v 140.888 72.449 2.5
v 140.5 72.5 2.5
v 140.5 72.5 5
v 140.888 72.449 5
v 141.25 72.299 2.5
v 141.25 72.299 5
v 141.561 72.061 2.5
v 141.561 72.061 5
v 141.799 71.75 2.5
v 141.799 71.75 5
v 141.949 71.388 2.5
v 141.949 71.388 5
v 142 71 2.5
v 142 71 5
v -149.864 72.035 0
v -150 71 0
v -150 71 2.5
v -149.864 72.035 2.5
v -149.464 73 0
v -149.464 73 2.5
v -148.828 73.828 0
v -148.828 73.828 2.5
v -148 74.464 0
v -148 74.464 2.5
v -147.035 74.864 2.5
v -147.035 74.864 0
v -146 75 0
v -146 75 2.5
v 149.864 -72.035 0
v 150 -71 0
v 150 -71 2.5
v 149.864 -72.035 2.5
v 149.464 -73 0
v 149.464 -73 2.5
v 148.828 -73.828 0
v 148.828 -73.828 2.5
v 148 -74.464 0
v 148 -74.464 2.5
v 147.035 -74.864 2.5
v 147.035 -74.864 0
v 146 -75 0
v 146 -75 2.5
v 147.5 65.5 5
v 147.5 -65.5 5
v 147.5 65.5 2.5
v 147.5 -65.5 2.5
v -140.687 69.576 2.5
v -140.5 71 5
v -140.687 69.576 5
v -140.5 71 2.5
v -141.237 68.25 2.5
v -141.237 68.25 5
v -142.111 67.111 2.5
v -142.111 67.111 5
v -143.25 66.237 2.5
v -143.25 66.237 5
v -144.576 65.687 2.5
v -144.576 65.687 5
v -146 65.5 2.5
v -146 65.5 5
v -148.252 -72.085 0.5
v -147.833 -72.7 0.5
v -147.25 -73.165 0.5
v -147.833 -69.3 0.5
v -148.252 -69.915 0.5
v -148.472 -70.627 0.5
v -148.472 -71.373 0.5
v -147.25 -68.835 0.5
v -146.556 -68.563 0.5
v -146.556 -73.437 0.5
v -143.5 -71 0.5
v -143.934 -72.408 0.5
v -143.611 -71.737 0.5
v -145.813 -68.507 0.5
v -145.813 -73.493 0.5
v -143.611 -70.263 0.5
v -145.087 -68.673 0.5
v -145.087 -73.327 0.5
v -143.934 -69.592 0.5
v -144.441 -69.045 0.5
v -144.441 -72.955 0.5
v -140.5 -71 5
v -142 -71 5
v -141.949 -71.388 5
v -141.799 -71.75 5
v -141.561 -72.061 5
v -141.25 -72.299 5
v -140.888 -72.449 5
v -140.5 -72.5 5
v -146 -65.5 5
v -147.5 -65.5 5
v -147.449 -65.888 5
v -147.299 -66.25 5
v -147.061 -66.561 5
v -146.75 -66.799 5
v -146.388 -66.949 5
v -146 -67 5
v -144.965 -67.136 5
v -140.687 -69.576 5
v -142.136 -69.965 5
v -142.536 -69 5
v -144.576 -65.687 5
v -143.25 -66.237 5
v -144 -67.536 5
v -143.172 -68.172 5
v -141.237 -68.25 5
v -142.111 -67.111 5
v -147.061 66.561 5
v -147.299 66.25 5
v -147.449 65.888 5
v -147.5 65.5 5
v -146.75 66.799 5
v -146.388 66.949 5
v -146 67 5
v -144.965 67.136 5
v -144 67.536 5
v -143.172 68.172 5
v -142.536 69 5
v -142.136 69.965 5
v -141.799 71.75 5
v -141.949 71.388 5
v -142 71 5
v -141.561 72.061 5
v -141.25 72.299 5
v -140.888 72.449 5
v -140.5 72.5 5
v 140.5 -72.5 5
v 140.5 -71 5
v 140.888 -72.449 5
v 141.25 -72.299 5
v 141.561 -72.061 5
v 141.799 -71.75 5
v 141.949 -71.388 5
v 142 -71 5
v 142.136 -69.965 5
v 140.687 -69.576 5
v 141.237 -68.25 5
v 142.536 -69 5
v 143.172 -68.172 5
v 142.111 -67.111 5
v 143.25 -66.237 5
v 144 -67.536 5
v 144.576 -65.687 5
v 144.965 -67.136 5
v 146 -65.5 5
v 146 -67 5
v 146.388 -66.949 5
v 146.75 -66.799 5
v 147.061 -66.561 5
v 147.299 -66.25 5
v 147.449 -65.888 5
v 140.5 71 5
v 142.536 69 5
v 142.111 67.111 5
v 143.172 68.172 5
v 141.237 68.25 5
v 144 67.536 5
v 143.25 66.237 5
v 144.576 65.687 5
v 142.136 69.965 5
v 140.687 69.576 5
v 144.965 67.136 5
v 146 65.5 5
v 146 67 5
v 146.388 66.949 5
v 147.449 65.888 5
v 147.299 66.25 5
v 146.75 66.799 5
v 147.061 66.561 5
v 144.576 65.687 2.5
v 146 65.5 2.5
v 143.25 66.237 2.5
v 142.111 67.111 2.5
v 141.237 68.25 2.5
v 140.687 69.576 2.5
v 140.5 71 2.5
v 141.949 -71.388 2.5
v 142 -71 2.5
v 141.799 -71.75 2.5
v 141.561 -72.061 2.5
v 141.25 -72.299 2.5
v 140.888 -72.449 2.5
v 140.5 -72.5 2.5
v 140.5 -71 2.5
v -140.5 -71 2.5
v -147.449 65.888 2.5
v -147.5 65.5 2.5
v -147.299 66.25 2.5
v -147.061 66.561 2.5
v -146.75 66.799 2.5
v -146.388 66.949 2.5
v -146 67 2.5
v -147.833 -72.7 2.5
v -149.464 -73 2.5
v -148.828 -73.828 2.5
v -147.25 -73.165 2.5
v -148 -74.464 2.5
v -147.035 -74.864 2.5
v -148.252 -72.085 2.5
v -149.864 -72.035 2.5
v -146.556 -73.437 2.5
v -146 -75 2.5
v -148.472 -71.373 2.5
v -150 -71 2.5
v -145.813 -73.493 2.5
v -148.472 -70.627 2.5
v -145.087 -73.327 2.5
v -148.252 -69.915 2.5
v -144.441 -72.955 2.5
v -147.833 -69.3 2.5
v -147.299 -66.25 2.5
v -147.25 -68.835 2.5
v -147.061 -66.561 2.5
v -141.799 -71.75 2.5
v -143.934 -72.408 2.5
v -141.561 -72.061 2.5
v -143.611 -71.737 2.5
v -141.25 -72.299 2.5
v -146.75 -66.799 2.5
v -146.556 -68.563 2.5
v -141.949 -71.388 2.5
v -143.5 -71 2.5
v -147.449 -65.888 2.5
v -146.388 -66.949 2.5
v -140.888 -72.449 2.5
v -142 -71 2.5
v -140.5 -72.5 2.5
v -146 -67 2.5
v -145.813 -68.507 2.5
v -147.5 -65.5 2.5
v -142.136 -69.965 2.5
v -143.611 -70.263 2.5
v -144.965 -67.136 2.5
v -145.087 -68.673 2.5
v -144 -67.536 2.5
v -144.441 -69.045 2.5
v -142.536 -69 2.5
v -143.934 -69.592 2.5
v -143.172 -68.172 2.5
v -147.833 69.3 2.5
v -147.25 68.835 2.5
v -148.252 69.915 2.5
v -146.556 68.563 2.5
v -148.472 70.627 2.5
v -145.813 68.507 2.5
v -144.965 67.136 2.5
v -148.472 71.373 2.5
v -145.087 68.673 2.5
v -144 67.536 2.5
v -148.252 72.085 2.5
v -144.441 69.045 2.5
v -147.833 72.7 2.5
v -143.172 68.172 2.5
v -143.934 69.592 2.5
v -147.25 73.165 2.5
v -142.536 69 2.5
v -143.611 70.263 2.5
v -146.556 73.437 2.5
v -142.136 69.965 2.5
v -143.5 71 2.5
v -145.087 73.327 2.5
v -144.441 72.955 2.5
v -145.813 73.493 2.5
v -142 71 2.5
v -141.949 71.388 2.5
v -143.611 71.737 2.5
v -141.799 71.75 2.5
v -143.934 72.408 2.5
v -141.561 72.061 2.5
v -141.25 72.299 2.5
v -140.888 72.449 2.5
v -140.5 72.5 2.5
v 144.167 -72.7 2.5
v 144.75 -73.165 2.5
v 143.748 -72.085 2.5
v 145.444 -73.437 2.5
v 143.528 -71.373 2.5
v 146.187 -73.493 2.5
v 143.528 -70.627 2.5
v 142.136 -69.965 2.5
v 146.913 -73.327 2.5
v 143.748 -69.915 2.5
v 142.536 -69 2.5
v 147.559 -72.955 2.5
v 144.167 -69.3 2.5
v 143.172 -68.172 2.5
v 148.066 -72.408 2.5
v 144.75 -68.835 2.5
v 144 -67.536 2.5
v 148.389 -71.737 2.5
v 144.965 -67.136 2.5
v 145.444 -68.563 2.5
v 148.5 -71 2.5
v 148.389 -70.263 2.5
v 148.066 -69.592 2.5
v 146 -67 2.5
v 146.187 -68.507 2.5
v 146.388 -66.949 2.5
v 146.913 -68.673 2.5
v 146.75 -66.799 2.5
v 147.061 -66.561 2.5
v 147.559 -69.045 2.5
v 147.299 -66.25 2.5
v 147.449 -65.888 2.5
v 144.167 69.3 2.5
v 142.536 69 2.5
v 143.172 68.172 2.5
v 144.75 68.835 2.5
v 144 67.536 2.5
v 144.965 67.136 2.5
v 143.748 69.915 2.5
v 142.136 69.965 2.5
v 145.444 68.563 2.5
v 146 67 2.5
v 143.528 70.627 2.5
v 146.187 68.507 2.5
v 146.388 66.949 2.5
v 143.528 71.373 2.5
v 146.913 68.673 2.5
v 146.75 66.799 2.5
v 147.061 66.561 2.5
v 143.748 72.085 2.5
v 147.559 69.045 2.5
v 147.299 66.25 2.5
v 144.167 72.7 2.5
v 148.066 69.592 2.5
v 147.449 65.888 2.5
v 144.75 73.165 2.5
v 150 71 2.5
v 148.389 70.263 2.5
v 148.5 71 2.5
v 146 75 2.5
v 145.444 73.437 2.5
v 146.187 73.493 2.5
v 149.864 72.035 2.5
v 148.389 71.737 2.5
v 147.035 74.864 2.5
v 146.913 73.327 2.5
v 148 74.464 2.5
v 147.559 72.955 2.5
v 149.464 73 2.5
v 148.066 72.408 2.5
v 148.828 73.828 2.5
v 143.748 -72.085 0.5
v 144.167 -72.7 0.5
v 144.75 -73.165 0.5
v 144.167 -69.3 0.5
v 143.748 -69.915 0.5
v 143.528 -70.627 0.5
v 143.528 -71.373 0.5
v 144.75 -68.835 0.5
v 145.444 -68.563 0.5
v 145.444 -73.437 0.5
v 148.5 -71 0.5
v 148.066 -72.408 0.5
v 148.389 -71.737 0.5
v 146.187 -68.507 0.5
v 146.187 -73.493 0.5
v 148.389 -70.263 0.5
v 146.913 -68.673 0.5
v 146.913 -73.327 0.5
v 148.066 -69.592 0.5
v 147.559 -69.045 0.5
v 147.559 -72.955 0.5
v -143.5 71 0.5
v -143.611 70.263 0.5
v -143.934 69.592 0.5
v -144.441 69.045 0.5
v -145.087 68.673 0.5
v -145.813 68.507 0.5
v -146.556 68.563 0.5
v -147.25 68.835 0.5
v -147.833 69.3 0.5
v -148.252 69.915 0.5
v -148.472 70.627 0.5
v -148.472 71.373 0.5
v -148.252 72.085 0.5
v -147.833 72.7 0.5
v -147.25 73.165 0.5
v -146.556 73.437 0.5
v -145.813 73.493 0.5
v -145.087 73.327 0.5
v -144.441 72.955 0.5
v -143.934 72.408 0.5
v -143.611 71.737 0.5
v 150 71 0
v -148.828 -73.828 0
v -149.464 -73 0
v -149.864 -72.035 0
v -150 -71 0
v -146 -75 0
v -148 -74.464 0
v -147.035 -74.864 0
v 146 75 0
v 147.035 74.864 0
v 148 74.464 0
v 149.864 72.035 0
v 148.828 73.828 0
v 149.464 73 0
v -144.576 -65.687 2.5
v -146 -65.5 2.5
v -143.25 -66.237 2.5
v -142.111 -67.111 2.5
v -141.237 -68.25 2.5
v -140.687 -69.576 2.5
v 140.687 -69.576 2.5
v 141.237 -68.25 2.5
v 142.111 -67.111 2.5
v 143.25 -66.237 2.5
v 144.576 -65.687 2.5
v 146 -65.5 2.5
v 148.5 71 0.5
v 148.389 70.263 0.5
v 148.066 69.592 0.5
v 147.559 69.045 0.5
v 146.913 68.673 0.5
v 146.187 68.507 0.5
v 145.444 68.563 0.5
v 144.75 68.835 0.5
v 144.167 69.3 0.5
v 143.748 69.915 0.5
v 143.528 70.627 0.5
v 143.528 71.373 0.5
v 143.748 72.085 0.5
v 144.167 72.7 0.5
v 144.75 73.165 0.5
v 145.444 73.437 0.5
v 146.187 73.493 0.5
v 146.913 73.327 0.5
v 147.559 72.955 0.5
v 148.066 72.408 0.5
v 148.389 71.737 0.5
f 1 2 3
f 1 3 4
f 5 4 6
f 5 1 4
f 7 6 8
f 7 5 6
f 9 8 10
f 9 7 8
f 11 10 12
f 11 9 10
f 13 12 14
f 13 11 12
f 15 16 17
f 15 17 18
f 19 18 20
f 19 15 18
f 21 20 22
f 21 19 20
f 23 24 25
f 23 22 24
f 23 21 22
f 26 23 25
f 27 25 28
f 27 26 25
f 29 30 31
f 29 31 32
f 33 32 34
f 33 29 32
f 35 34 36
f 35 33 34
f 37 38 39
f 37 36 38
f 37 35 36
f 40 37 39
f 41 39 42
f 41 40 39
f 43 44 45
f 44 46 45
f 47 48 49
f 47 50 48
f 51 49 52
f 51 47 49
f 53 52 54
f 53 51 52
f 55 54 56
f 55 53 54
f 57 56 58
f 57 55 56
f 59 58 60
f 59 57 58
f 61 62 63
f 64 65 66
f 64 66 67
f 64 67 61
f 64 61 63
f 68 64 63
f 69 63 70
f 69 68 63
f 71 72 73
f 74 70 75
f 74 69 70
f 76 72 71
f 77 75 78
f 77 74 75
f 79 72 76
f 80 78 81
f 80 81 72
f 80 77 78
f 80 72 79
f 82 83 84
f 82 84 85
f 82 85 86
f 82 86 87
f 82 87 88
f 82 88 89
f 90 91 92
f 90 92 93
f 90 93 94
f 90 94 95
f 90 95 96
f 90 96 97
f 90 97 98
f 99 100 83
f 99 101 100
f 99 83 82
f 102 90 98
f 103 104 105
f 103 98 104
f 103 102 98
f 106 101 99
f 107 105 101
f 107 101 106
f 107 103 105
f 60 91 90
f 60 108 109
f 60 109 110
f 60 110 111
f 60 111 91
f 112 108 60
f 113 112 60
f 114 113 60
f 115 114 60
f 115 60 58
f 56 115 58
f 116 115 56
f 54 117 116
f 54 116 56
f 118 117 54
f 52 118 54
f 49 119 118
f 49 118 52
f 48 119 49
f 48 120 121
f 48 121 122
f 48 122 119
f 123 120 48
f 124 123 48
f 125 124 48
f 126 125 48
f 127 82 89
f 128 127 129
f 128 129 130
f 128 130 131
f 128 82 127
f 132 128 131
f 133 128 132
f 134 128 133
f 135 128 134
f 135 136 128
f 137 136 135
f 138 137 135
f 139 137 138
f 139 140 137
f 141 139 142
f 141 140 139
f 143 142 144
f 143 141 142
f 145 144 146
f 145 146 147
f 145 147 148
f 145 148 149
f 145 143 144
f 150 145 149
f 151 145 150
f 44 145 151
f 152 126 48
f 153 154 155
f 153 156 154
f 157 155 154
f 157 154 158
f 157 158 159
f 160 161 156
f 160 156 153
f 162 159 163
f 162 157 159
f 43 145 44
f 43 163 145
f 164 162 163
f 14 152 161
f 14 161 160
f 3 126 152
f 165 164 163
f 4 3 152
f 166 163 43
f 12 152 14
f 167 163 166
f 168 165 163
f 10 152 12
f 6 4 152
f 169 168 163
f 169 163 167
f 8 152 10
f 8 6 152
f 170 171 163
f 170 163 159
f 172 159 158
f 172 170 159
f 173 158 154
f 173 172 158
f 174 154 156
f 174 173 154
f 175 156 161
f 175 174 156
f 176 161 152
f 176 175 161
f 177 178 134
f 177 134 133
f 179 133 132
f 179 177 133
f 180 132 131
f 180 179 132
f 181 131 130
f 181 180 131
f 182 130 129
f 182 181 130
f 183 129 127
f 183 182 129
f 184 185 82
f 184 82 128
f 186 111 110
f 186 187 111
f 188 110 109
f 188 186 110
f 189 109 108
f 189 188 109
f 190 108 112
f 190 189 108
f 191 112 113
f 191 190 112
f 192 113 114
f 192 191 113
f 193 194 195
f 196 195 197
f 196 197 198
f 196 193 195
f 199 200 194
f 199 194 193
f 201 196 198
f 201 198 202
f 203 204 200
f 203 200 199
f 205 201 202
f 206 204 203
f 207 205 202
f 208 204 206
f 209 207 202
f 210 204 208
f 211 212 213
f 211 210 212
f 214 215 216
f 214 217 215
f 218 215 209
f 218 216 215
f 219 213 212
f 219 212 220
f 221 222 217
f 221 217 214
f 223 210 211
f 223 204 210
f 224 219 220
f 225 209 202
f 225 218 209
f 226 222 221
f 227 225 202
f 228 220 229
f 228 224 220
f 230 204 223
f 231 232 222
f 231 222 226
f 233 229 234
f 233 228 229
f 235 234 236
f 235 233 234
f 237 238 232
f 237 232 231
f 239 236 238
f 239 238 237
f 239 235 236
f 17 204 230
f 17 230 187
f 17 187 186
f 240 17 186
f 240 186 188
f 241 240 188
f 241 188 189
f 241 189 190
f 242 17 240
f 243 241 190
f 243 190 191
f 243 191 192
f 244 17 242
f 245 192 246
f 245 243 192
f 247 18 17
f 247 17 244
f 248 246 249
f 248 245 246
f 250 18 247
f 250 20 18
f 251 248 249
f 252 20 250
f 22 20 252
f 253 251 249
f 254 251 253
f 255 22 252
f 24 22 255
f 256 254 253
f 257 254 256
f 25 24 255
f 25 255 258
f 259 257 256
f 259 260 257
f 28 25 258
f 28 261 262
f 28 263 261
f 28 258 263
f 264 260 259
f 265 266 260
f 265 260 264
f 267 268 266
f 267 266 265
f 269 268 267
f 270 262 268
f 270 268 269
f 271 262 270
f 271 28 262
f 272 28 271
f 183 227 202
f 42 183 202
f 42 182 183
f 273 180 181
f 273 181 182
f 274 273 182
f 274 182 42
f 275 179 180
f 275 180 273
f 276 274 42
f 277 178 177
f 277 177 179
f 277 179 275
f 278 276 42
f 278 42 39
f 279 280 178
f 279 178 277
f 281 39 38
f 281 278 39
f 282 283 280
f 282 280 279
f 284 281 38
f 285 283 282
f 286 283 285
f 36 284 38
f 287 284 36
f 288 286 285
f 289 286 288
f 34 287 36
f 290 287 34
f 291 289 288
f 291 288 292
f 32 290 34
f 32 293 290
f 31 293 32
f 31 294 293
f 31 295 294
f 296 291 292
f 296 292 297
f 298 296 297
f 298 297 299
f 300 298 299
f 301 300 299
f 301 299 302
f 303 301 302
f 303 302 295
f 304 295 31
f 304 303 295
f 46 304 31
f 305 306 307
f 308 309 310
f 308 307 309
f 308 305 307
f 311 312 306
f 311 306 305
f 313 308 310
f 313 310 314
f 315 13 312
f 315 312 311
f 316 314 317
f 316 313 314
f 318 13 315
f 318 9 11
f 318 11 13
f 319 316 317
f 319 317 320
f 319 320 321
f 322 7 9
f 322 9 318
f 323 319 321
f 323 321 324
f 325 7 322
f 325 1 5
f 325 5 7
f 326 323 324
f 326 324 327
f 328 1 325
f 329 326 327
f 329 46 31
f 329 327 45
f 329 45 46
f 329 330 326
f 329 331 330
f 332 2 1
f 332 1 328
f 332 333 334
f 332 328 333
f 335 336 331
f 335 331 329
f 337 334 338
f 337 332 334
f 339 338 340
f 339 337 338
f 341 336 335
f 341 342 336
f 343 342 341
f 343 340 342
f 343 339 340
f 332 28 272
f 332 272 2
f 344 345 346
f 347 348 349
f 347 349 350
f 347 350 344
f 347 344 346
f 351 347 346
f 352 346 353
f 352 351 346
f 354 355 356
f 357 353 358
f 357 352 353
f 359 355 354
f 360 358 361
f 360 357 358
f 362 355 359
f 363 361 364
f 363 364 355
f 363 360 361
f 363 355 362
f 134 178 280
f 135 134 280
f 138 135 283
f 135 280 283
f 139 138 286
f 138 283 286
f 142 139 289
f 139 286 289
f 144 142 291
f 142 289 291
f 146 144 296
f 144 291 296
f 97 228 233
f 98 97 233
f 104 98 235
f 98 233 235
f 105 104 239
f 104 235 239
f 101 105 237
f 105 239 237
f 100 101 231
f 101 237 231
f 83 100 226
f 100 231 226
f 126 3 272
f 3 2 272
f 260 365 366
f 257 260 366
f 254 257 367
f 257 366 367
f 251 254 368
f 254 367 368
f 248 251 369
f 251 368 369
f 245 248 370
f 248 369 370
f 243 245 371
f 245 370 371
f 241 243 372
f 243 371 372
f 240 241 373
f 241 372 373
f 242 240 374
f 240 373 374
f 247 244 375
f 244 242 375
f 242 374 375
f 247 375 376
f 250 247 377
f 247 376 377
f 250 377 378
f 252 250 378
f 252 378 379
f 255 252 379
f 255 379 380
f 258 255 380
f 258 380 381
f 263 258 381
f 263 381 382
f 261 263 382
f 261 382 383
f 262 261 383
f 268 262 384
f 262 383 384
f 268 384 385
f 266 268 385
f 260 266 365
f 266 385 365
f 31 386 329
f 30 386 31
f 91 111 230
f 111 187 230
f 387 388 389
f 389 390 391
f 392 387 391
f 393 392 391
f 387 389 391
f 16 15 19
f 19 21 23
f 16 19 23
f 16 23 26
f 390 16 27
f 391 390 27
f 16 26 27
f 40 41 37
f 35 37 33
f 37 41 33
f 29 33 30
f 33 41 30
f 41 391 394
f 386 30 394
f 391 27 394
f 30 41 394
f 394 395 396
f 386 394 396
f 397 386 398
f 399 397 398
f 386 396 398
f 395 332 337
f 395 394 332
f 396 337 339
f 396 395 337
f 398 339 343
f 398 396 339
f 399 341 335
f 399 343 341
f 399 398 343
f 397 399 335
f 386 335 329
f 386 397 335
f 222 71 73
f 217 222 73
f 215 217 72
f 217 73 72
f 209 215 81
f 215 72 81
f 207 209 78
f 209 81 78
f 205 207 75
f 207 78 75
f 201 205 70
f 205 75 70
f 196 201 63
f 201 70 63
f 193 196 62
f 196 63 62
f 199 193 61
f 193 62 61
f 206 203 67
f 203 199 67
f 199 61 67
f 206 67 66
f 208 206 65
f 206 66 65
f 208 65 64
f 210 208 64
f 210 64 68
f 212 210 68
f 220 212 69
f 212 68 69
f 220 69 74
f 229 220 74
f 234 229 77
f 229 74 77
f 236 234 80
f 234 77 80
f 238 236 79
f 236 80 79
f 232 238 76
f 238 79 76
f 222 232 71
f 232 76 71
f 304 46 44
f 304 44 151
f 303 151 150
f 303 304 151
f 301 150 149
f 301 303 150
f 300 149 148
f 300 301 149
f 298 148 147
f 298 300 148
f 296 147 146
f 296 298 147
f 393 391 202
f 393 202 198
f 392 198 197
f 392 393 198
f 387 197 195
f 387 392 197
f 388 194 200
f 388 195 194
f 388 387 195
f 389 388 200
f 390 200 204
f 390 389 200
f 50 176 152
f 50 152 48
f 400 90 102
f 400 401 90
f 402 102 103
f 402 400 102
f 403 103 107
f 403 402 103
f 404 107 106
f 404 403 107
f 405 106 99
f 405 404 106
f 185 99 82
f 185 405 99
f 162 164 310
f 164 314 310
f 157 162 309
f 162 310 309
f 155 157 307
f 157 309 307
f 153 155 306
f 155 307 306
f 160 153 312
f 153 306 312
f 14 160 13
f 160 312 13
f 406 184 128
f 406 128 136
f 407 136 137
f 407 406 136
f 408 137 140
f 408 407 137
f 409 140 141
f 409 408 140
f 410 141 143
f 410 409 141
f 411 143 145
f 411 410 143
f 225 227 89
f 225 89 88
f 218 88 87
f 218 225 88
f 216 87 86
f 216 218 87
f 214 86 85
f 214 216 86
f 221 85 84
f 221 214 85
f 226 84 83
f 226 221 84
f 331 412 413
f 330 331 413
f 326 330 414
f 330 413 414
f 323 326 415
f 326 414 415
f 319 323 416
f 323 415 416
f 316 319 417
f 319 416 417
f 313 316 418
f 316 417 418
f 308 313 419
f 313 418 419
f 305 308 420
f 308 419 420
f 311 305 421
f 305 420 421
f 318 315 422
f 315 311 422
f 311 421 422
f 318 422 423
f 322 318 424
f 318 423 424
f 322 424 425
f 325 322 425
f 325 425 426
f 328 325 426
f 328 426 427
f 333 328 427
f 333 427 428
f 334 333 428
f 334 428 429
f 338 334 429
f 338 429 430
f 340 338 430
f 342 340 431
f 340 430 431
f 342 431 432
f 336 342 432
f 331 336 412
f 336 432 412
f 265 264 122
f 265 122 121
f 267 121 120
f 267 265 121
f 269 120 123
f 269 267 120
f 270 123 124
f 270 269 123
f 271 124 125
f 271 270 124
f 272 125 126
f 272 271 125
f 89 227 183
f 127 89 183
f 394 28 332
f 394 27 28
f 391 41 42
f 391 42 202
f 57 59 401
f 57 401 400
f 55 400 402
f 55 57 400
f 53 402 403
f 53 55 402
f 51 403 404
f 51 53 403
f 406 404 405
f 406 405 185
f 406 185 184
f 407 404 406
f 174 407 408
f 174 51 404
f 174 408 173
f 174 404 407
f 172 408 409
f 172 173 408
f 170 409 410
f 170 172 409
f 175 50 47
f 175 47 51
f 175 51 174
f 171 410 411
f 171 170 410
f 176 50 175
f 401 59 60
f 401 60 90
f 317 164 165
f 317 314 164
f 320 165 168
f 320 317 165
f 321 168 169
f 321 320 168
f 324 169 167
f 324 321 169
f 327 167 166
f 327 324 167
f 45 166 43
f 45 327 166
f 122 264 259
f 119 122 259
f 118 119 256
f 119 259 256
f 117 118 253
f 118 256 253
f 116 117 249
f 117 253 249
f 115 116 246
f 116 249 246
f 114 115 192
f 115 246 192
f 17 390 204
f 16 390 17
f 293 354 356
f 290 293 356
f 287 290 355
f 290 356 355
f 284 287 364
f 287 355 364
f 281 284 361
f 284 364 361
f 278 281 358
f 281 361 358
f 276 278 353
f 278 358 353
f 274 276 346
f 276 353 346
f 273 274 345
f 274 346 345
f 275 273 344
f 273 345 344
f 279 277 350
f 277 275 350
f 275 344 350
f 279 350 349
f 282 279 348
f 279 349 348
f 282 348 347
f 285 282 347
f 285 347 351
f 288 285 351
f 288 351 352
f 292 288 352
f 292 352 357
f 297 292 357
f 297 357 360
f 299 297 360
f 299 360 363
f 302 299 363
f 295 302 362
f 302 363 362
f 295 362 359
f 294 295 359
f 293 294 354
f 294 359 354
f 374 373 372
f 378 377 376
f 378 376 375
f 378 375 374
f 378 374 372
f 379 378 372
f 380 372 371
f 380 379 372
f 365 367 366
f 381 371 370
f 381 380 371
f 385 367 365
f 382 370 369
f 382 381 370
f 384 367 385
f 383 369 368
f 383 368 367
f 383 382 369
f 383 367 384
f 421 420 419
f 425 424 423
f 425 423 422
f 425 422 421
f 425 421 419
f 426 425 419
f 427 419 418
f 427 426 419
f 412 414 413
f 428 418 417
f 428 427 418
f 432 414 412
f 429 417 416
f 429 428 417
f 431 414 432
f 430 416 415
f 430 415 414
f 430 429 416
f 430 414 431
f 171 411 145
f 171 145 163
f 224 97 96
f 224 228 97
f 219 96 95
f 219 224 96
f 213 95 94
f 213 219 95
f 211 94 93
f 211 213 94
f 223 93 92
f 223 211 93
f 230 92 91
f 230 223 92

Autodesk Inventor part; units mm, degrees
ref_plane "YZ Plane" through (0, 0, 0) normal (1, 0, 0) x (0, 1, 0)
ref_plane "XZ Plane" through (0, 0, 0) normal (0, 1, 0) x (-1, 0, 0)
ref_plane "XY Plane" through (0, 0, 0) normal (0, 0, 1) x (1, 0, 0)
sketch "Sketch1" plane through (0, 0, 0) normal (0, 0, 1) x (1, 0, 0)
  line L0 (-150, -75) -> (150, -75) construction
  line L1 (150, -75) -> (150, 75) construction
  line L2 (150, 75) -> (-150, 75) construction
  line L3 (-150, 75) -> (-150, -75) construction
  line L4 (-150, -75) -> (150, 75) construction
  line L5 (150, -75) -> (-150, 75) construction
  line L6 (147.5, -72.5) -> (-147.5, -72.5) construction
  line L7 (-147.5, -72.5) -> (-147.5, 72.5) construction
  line L8 (-147.5, 72.5) -> (147.5, 72.5) construction
  line L9 (147.5, 72.5) -> (147.5, -72.5) construction
  line L10 (147.5, -72.5) -> (-147.5, 72.5) construction
  line L11 (-147.5, -72.5) -> (147.5, 72.5) construction
  line L12 (-150, 75) -> (-146, 75) construction
  line L13 (-146, 75) -> (-146, 71) construction
  line L14 (-146, 71) -> (-150, 71) construction
  line L15 (-150, 71) -> (-150, 75) construction
  arc A0 (-146, 75) -> (-150, 71) centre (-146, 71) ccw
  line L16 (-150, -75) -> (-146, -75) construction
  line L17 (-146, -75) -> (-146, -71) construction
  line L18 (-146, -71) -> (-150, -71) construction
  line L19 (-150, -71) -> (-150, -75) construction
  line L20 (150, -75) -> (146, -75) construction
  line L21 (146, -75) -> (146, -71) construction
  line L22 (146, -71) -> (150, -71) construction
  line L23 (150, -71) -> (150, -75) construction
  line L24 (150, 75) -> (146, 75) construction
  line L25 (146, 75) -> (146, 71) construction
  line L26 (146, 71) -> (150, 71) construction
  line L27 (150, 71) -> (150, 75) construction
  line L28 (-146, 75) -> (146, 75)
  arc A1 (150, 71) -> (146, 75) centre (146, 71) ccw
  line L29 (150, 71) -> (150, -71)
  arc A2 (146, -75) -> (150, -71) centre (146, -71) ccw
  line L30 (146, -75) -> (-146, -75)
  arc A3 (-150, -71) -> (-146, -75) centre (-146, -71) ccw
  line L31 (-150, -71) -> (-150, 71)
  circle A4 centre (-146, 71) radius 2.5
  circle A5 centre (-146, -71) radius 2.5
  circle A6 centre (146, -71) radius 2.5
  circle A7 centre (146, 71) radius 2.5
  line L32 (-146, 71) -> (-142, 71) construction
  line L33 (-142, 71) -> (-142, 67) construction
  line L34 (-142, 67) -> (-146, 67) construction
  line L35 (-146, 67) -> (-146, 71) construction
  line L36 (-146, -71) -> (-142, -71) construction
  line L37 (-142, -71) -> (-142, -67) construction
  line L38 (-142, -67) -> (-146, -67) construction
  line L39 (-146, -67) -> (-146, -71) construction
  line L40 (146, -71) -> (142, -71) construction
  line L41 (142, -71) -> (142, -67) construction
  line L42 (142, -67) -> (146, -67) construction
  line L43 (146, -67) -> (146, -71) construction
  line L44 (146, 71) -> (142, 71) construction
  line L45 (142, 71) -> (142, 67) construction
  line L46 (142, 67) -> (146, 67) construction
  line L47 (146, 67) -> (146, 71) construction
  arc A8 (-146, 67) -> (-142, 71) centre (-146, 71) ccw
  arc A9 (-142, -71) -> (-146, -67) centre (-146, -71) ccw
  arc A10 (146, -67) -> (142, -71) centre (146, -71) ccw
  arc A11 (142, 71) -> (146, 67) centre (146, 71) ccw
  line L48 (-142, 71) -> (-140.5, 71) construction
  line L49 (-140.5, 71) -> (-140.5, 72.5) construction
  line L50 (-140.5, 72.5) -> (-142, 72.5) construction
  line L51 (-142, 72.5) -> (-142, 71) construction
  line L52 (-146, 67) -> (-147.5, 67) construction
  line L53 (-147.5, 67) -> (-147.5, 65.5) construction
  line L54 (-147.5, 65.5) -> (-146, 65.5) construction
  line L55 (-146, 65.5) -> (-146, 67) construction
  line L56 (142, 71) -> (140.5, 71) construction
  line L57 (140.5, 71) -> (140.5, 72.5) construction
  line L58 (140.5, 72.5) -> (142, 72.5) construction
  line L59 (142, 72.5) -> (142, 71) construction
  line L60 (146, 67) -> (147.5, 67) construction
  line L61 (147.5, 67) -> (147.5, 65.5) construction
  line L62 (147.5, 65.5) -> (146, 65.5) construction
  line L63 (146, 65.5) -> (146, 67) construction
  line L64 (146, -67) -> (147.5, -67) construction
  line L65 (147.5, -67) -> (147.5, -65.5) construction
  line L66 (147.5, -65.5) -> (146, -65.5) construction
  line L67 (146, -65.5) -> (146, -67) construction
  line L68 (142, -71) -> (140.5, -71) construction
  line L69 (140.5, -71) -> (140.5, -72.5) construction
  line L70 (140.5, -72.5) -> (142, -72.5) construction
  line L71 (142, -72.5) -> (142, -71) construction
  line L72 (-142, -71) -> (-140.5, -71) construction
  line L73 (-140.5, -71) -> (-140.5, -72.5) construction
  line L74 (-140.5, -72.5) -> (-142, -72.5) construction
  line L75 (-142, -72.5) -> (-142, -71) construction
  line L76 (-146, -67) -> (-147.5, -67) construction
  line L77 (-147.5, -67) -> (-147.5, -65.5) construction
  line L78 (-147.5, -65.5) -> (-146, -65.5) construction
  line L79 (-146, -65.5) -> (-146, -67) construction
  arc A12 (-147.5, -65.5) -> (-146, -67) centre (-146, -65.5) ccw
  arc A13 (-142, -71) -> (-140.5, -72.5) centre (-140.5, -71) ccw
  arc A14 (-140.5, 72.5) -> (-142, 71) centre (-140.5, 71) ccw
  arc A15 (-146, 67) -> (-147.5, 65.5) centre (-146, 65.5) ccw
  arc A16 (140.5, -72.5) -> (142, -71) centre (140.5, -71) ccw
  arc A17 (146, -67) -> (147.5, -65.5) centre (146, -65.5) ccw
  line L80 (147.5, -65.5) -> (147.5, 65.5)
  arc A18 (147.5, 65.5) -> (146, 67) centre (146, 65.5) ccw
  arc A19 (142, 71) -> (140.5, 72.5) centre (140.5, 71) ccw
  line L81 (140.5, 72.5) -> (-140.5, 72.5)
  line L82 (-147.5, 65.5) -> (-147.5, -65.5)
  line L83 (-140.5, -72.5) -> (140.5, -72.5)
  line L84 (146, 75) -> (-146, 75)
  arc A20 (-146, 75) -> (-150, 71) centre (-146, 71) ccw
  line L85 (-150, 71) -> (-150, -71)
  arc A21 (-150, -71) -> (-146, -75) centre (-146, -71) ccw
  line L86 (-146, -75) -> (146, -75)
  arc A22 (146, -75) -> (150, -71) centre (146, -71) ccw
  line L87 (150, -71) -> (150, 71)
  arc A23 (150, 71) -> (146, 75) centre (146, 71) ccw
  arc A24 (142, 71) -> (146, 67) centre (146, 71) ccw
  arc A25 (142, 71) -> (140.5, 72.5) centre (140.5, 71) ccw
  line L88 (140.5, 72.5) -> (-140.5, 72.5)
  arc A26 (-140.5, 72.5) -> (-142, 71) centre (-140.5, 71) ccw
  arc A27 (-146, 67) -> (-142, 71) centre (-146, 71) ccw
  arc A28 (-146, 67) -> (-147.5, 65.5) centre (-146, 65.5) ccw
  line L89 (-147.5, 65.5) -> (-147.5, -65.5)
  arc A29 (-147.5, -65.5) -> (-146, -67) centre (-146, -65.5) ccw
  arc A30 (-142, -71) -> (-146, -67) centre (-146, -71) ccw
  arc A31 (-142, -71) -> (-140.5, -72.5) centre (-140.5, -71) ccw
  line L90 (-140.5, -72.5) -> (140.5, -72.5)
  arc A32 (140.5, -72.5) -> (142, -71) centre (140.5, -71) ccw
  arc A33 (146, -67) -> (142, -71) centre (146, -71) ccw
  arc A34 (146, -67) -> (147.5, -65.5) centre (146, -65.5) ccw
  line L91 (147.5, -65.5) -> (147.5, 65.5)
  arc A35 (147.5, 65.5) -> (146, 67) centre (146, 65.5) ccw
  line L92 (-147.5, 72.5) -> (-140.5, 72.5) construction
  line L93 (-140.5, 72.5) -> (-140.5, 65.5) construction
  line L94 (-140.5, 65.5) -> (-147.5, 65.5) construction
  line L95 (-147.5, 65.5) -> (-147.5, 72.5) construction
  line L96 (-147.5, -72.5) -> (-140.5, -72.5) construction
  line L97 (-140.5, -72.5) -> (-140.5, -65.5) construction
  line L98 (-140.5, -65.5) -> (-147.5, -65.5) construction
  line L99 (-147.5, -65.5) -> (-147.5, -72.5) construction
  line L100 (147.5, -72.5) -> (140.5, -72.5) construction
  line L101 (140.5, -72.5) -> (140.5, -65.5) construction
  line L102 (140.5, -65.5) -> (147.5, -65.5) construction
  line L103 (147.5, -65.5) -> (147.5, -72.5) construction
  line L104 (140.5, 65.5) -> (147.5, 65.5) construction
  line L105 (147.5, 65.5) -> (147.5, 72.5) construction
  line L106 (147.5, 72.5) -> (140.5, 72.5) construction
  line L107 (140.5, 72.5) -> (140.5, 65.5) construction
  circle A36 centre (146, 71) radius 5.5 construction
  circle A37 centre (146, -71) radius 5.5 construction
  circle A38 centre (-146, -71) radius 5.5 construction
  circle A39 centre (-146, 71) radius 5.5 construction
  arc A40 (-146, 65.5) -> (-140.5, 71) centre (-146, 71) ccw
  arc A41 (140.5, 71) -> (146, 65.5) centre (146, 71) ccw
  line L108 (140.5, 71) -> (-140.5, 71)
  line L109 (-146, 65.5) -> (-146, -65.5)
  arc A42 (-140.5, -71) -> (-146, -65.5) centre (-146, -71) ccw
  line L110 (-140.5, -71) -> (140.5, -71)
  arc A43 (146, -65.5) -> (140.5, -71) centre (146, -71) ccw
  line L111 (146, -65.5) -> (146, 65.5)
  point P0 (0, 0)
  point P1 (0, 0)
  dimension "d0" = 300
  dimension "d1" = 150
  dimension "d2" = 295
  dimension "d3" = 145
  dimension "d4" = 4
  dimension "d5" = 4
  dimension "d6" = 4
  dimension "d7" = 4
  dimension "d8" = 4
  dimension "d9" = 4
  dimension "d10" = 4
  dimension "d11" = 4
  dimension "d12" = 4
  dimension "d13" = 4
  dimension "d14" = 4
  dimension "d15" = 4
  dimension "d16" = 5
  dimension "d17" = 5
  dimension "d18" = 5
  dimension "d19" = 5
  dimension "d20" = 4
  dimension "d21" = 4
  dimension "d22" = 4
  dimension "d23" = 4
  dimension "d24" = 4
  dimension "d25" = 4
  dimension "d26" = 4
  dimension "d27" = 4
  dimension "d28" = 4
  dimension "d29" = 4
  dimension "d30" = 4
  dimension "d31" = 4
  dimension "d32" = 1.5
  dimension "d33" = 1.5
  dimension "d34" = 1.5
  dimension "d35" = 1.5
  dimension "d36" = 1.5
  dimension "d37" = 1.5
  dimension "d38" = 1.5
  dimension "d39" = 1.5
  dimension "d40" = 1.5
  dimension "d41" = 1.5
  dimension "d42" = 1.5
  dimension "d43" = 1.5
  dimension "d44" = 1.5
  dimension "d45" = 1.5
  dimension "d46" = 1.5
  dimension "d47" = 1.5
  dimension "d48" = 1.5
  dimension "d49" = 1.5
  dimension "d50" = 1.5
  dimension "d51" = 1.5
  dimension "d52" = 1.5
  dimension "d53" = 1.5
  dimension "d54" = 1.5
  dimension "d55" = 1.5
  dimension "d60" = 9.5
  dimension "d61" = 9.5
  dimension "d62" = 140.5
  dimension "d63" = 290.5
extrude "Extrusion1" add sketch "Sketch1" along normal blind 2.5 contours L28 A1 L29 A2 L30 A3 L31 A0 | A8 A14 L81 A19 A11 A18 L80 A17 A10 A16 L83 A13 A9 A12 L82 A15 | A40 L108 A41 L111 A43 L110 A42 L109
extrude "Extrusion2" add sketch "Sketch1" along normal blind 0.5 contours A4 | A5 | A6 | A7
extrude "Extrusion3" add sketch "Sketch1" along normal blind 5 contours A8 A14 L81 A19 A11 A18 L80 A17 A10 A16 L83 A13 A9 A12 L82 A15
equation "\"d21\" = d20"
properties part number "electronics_box_cap"
